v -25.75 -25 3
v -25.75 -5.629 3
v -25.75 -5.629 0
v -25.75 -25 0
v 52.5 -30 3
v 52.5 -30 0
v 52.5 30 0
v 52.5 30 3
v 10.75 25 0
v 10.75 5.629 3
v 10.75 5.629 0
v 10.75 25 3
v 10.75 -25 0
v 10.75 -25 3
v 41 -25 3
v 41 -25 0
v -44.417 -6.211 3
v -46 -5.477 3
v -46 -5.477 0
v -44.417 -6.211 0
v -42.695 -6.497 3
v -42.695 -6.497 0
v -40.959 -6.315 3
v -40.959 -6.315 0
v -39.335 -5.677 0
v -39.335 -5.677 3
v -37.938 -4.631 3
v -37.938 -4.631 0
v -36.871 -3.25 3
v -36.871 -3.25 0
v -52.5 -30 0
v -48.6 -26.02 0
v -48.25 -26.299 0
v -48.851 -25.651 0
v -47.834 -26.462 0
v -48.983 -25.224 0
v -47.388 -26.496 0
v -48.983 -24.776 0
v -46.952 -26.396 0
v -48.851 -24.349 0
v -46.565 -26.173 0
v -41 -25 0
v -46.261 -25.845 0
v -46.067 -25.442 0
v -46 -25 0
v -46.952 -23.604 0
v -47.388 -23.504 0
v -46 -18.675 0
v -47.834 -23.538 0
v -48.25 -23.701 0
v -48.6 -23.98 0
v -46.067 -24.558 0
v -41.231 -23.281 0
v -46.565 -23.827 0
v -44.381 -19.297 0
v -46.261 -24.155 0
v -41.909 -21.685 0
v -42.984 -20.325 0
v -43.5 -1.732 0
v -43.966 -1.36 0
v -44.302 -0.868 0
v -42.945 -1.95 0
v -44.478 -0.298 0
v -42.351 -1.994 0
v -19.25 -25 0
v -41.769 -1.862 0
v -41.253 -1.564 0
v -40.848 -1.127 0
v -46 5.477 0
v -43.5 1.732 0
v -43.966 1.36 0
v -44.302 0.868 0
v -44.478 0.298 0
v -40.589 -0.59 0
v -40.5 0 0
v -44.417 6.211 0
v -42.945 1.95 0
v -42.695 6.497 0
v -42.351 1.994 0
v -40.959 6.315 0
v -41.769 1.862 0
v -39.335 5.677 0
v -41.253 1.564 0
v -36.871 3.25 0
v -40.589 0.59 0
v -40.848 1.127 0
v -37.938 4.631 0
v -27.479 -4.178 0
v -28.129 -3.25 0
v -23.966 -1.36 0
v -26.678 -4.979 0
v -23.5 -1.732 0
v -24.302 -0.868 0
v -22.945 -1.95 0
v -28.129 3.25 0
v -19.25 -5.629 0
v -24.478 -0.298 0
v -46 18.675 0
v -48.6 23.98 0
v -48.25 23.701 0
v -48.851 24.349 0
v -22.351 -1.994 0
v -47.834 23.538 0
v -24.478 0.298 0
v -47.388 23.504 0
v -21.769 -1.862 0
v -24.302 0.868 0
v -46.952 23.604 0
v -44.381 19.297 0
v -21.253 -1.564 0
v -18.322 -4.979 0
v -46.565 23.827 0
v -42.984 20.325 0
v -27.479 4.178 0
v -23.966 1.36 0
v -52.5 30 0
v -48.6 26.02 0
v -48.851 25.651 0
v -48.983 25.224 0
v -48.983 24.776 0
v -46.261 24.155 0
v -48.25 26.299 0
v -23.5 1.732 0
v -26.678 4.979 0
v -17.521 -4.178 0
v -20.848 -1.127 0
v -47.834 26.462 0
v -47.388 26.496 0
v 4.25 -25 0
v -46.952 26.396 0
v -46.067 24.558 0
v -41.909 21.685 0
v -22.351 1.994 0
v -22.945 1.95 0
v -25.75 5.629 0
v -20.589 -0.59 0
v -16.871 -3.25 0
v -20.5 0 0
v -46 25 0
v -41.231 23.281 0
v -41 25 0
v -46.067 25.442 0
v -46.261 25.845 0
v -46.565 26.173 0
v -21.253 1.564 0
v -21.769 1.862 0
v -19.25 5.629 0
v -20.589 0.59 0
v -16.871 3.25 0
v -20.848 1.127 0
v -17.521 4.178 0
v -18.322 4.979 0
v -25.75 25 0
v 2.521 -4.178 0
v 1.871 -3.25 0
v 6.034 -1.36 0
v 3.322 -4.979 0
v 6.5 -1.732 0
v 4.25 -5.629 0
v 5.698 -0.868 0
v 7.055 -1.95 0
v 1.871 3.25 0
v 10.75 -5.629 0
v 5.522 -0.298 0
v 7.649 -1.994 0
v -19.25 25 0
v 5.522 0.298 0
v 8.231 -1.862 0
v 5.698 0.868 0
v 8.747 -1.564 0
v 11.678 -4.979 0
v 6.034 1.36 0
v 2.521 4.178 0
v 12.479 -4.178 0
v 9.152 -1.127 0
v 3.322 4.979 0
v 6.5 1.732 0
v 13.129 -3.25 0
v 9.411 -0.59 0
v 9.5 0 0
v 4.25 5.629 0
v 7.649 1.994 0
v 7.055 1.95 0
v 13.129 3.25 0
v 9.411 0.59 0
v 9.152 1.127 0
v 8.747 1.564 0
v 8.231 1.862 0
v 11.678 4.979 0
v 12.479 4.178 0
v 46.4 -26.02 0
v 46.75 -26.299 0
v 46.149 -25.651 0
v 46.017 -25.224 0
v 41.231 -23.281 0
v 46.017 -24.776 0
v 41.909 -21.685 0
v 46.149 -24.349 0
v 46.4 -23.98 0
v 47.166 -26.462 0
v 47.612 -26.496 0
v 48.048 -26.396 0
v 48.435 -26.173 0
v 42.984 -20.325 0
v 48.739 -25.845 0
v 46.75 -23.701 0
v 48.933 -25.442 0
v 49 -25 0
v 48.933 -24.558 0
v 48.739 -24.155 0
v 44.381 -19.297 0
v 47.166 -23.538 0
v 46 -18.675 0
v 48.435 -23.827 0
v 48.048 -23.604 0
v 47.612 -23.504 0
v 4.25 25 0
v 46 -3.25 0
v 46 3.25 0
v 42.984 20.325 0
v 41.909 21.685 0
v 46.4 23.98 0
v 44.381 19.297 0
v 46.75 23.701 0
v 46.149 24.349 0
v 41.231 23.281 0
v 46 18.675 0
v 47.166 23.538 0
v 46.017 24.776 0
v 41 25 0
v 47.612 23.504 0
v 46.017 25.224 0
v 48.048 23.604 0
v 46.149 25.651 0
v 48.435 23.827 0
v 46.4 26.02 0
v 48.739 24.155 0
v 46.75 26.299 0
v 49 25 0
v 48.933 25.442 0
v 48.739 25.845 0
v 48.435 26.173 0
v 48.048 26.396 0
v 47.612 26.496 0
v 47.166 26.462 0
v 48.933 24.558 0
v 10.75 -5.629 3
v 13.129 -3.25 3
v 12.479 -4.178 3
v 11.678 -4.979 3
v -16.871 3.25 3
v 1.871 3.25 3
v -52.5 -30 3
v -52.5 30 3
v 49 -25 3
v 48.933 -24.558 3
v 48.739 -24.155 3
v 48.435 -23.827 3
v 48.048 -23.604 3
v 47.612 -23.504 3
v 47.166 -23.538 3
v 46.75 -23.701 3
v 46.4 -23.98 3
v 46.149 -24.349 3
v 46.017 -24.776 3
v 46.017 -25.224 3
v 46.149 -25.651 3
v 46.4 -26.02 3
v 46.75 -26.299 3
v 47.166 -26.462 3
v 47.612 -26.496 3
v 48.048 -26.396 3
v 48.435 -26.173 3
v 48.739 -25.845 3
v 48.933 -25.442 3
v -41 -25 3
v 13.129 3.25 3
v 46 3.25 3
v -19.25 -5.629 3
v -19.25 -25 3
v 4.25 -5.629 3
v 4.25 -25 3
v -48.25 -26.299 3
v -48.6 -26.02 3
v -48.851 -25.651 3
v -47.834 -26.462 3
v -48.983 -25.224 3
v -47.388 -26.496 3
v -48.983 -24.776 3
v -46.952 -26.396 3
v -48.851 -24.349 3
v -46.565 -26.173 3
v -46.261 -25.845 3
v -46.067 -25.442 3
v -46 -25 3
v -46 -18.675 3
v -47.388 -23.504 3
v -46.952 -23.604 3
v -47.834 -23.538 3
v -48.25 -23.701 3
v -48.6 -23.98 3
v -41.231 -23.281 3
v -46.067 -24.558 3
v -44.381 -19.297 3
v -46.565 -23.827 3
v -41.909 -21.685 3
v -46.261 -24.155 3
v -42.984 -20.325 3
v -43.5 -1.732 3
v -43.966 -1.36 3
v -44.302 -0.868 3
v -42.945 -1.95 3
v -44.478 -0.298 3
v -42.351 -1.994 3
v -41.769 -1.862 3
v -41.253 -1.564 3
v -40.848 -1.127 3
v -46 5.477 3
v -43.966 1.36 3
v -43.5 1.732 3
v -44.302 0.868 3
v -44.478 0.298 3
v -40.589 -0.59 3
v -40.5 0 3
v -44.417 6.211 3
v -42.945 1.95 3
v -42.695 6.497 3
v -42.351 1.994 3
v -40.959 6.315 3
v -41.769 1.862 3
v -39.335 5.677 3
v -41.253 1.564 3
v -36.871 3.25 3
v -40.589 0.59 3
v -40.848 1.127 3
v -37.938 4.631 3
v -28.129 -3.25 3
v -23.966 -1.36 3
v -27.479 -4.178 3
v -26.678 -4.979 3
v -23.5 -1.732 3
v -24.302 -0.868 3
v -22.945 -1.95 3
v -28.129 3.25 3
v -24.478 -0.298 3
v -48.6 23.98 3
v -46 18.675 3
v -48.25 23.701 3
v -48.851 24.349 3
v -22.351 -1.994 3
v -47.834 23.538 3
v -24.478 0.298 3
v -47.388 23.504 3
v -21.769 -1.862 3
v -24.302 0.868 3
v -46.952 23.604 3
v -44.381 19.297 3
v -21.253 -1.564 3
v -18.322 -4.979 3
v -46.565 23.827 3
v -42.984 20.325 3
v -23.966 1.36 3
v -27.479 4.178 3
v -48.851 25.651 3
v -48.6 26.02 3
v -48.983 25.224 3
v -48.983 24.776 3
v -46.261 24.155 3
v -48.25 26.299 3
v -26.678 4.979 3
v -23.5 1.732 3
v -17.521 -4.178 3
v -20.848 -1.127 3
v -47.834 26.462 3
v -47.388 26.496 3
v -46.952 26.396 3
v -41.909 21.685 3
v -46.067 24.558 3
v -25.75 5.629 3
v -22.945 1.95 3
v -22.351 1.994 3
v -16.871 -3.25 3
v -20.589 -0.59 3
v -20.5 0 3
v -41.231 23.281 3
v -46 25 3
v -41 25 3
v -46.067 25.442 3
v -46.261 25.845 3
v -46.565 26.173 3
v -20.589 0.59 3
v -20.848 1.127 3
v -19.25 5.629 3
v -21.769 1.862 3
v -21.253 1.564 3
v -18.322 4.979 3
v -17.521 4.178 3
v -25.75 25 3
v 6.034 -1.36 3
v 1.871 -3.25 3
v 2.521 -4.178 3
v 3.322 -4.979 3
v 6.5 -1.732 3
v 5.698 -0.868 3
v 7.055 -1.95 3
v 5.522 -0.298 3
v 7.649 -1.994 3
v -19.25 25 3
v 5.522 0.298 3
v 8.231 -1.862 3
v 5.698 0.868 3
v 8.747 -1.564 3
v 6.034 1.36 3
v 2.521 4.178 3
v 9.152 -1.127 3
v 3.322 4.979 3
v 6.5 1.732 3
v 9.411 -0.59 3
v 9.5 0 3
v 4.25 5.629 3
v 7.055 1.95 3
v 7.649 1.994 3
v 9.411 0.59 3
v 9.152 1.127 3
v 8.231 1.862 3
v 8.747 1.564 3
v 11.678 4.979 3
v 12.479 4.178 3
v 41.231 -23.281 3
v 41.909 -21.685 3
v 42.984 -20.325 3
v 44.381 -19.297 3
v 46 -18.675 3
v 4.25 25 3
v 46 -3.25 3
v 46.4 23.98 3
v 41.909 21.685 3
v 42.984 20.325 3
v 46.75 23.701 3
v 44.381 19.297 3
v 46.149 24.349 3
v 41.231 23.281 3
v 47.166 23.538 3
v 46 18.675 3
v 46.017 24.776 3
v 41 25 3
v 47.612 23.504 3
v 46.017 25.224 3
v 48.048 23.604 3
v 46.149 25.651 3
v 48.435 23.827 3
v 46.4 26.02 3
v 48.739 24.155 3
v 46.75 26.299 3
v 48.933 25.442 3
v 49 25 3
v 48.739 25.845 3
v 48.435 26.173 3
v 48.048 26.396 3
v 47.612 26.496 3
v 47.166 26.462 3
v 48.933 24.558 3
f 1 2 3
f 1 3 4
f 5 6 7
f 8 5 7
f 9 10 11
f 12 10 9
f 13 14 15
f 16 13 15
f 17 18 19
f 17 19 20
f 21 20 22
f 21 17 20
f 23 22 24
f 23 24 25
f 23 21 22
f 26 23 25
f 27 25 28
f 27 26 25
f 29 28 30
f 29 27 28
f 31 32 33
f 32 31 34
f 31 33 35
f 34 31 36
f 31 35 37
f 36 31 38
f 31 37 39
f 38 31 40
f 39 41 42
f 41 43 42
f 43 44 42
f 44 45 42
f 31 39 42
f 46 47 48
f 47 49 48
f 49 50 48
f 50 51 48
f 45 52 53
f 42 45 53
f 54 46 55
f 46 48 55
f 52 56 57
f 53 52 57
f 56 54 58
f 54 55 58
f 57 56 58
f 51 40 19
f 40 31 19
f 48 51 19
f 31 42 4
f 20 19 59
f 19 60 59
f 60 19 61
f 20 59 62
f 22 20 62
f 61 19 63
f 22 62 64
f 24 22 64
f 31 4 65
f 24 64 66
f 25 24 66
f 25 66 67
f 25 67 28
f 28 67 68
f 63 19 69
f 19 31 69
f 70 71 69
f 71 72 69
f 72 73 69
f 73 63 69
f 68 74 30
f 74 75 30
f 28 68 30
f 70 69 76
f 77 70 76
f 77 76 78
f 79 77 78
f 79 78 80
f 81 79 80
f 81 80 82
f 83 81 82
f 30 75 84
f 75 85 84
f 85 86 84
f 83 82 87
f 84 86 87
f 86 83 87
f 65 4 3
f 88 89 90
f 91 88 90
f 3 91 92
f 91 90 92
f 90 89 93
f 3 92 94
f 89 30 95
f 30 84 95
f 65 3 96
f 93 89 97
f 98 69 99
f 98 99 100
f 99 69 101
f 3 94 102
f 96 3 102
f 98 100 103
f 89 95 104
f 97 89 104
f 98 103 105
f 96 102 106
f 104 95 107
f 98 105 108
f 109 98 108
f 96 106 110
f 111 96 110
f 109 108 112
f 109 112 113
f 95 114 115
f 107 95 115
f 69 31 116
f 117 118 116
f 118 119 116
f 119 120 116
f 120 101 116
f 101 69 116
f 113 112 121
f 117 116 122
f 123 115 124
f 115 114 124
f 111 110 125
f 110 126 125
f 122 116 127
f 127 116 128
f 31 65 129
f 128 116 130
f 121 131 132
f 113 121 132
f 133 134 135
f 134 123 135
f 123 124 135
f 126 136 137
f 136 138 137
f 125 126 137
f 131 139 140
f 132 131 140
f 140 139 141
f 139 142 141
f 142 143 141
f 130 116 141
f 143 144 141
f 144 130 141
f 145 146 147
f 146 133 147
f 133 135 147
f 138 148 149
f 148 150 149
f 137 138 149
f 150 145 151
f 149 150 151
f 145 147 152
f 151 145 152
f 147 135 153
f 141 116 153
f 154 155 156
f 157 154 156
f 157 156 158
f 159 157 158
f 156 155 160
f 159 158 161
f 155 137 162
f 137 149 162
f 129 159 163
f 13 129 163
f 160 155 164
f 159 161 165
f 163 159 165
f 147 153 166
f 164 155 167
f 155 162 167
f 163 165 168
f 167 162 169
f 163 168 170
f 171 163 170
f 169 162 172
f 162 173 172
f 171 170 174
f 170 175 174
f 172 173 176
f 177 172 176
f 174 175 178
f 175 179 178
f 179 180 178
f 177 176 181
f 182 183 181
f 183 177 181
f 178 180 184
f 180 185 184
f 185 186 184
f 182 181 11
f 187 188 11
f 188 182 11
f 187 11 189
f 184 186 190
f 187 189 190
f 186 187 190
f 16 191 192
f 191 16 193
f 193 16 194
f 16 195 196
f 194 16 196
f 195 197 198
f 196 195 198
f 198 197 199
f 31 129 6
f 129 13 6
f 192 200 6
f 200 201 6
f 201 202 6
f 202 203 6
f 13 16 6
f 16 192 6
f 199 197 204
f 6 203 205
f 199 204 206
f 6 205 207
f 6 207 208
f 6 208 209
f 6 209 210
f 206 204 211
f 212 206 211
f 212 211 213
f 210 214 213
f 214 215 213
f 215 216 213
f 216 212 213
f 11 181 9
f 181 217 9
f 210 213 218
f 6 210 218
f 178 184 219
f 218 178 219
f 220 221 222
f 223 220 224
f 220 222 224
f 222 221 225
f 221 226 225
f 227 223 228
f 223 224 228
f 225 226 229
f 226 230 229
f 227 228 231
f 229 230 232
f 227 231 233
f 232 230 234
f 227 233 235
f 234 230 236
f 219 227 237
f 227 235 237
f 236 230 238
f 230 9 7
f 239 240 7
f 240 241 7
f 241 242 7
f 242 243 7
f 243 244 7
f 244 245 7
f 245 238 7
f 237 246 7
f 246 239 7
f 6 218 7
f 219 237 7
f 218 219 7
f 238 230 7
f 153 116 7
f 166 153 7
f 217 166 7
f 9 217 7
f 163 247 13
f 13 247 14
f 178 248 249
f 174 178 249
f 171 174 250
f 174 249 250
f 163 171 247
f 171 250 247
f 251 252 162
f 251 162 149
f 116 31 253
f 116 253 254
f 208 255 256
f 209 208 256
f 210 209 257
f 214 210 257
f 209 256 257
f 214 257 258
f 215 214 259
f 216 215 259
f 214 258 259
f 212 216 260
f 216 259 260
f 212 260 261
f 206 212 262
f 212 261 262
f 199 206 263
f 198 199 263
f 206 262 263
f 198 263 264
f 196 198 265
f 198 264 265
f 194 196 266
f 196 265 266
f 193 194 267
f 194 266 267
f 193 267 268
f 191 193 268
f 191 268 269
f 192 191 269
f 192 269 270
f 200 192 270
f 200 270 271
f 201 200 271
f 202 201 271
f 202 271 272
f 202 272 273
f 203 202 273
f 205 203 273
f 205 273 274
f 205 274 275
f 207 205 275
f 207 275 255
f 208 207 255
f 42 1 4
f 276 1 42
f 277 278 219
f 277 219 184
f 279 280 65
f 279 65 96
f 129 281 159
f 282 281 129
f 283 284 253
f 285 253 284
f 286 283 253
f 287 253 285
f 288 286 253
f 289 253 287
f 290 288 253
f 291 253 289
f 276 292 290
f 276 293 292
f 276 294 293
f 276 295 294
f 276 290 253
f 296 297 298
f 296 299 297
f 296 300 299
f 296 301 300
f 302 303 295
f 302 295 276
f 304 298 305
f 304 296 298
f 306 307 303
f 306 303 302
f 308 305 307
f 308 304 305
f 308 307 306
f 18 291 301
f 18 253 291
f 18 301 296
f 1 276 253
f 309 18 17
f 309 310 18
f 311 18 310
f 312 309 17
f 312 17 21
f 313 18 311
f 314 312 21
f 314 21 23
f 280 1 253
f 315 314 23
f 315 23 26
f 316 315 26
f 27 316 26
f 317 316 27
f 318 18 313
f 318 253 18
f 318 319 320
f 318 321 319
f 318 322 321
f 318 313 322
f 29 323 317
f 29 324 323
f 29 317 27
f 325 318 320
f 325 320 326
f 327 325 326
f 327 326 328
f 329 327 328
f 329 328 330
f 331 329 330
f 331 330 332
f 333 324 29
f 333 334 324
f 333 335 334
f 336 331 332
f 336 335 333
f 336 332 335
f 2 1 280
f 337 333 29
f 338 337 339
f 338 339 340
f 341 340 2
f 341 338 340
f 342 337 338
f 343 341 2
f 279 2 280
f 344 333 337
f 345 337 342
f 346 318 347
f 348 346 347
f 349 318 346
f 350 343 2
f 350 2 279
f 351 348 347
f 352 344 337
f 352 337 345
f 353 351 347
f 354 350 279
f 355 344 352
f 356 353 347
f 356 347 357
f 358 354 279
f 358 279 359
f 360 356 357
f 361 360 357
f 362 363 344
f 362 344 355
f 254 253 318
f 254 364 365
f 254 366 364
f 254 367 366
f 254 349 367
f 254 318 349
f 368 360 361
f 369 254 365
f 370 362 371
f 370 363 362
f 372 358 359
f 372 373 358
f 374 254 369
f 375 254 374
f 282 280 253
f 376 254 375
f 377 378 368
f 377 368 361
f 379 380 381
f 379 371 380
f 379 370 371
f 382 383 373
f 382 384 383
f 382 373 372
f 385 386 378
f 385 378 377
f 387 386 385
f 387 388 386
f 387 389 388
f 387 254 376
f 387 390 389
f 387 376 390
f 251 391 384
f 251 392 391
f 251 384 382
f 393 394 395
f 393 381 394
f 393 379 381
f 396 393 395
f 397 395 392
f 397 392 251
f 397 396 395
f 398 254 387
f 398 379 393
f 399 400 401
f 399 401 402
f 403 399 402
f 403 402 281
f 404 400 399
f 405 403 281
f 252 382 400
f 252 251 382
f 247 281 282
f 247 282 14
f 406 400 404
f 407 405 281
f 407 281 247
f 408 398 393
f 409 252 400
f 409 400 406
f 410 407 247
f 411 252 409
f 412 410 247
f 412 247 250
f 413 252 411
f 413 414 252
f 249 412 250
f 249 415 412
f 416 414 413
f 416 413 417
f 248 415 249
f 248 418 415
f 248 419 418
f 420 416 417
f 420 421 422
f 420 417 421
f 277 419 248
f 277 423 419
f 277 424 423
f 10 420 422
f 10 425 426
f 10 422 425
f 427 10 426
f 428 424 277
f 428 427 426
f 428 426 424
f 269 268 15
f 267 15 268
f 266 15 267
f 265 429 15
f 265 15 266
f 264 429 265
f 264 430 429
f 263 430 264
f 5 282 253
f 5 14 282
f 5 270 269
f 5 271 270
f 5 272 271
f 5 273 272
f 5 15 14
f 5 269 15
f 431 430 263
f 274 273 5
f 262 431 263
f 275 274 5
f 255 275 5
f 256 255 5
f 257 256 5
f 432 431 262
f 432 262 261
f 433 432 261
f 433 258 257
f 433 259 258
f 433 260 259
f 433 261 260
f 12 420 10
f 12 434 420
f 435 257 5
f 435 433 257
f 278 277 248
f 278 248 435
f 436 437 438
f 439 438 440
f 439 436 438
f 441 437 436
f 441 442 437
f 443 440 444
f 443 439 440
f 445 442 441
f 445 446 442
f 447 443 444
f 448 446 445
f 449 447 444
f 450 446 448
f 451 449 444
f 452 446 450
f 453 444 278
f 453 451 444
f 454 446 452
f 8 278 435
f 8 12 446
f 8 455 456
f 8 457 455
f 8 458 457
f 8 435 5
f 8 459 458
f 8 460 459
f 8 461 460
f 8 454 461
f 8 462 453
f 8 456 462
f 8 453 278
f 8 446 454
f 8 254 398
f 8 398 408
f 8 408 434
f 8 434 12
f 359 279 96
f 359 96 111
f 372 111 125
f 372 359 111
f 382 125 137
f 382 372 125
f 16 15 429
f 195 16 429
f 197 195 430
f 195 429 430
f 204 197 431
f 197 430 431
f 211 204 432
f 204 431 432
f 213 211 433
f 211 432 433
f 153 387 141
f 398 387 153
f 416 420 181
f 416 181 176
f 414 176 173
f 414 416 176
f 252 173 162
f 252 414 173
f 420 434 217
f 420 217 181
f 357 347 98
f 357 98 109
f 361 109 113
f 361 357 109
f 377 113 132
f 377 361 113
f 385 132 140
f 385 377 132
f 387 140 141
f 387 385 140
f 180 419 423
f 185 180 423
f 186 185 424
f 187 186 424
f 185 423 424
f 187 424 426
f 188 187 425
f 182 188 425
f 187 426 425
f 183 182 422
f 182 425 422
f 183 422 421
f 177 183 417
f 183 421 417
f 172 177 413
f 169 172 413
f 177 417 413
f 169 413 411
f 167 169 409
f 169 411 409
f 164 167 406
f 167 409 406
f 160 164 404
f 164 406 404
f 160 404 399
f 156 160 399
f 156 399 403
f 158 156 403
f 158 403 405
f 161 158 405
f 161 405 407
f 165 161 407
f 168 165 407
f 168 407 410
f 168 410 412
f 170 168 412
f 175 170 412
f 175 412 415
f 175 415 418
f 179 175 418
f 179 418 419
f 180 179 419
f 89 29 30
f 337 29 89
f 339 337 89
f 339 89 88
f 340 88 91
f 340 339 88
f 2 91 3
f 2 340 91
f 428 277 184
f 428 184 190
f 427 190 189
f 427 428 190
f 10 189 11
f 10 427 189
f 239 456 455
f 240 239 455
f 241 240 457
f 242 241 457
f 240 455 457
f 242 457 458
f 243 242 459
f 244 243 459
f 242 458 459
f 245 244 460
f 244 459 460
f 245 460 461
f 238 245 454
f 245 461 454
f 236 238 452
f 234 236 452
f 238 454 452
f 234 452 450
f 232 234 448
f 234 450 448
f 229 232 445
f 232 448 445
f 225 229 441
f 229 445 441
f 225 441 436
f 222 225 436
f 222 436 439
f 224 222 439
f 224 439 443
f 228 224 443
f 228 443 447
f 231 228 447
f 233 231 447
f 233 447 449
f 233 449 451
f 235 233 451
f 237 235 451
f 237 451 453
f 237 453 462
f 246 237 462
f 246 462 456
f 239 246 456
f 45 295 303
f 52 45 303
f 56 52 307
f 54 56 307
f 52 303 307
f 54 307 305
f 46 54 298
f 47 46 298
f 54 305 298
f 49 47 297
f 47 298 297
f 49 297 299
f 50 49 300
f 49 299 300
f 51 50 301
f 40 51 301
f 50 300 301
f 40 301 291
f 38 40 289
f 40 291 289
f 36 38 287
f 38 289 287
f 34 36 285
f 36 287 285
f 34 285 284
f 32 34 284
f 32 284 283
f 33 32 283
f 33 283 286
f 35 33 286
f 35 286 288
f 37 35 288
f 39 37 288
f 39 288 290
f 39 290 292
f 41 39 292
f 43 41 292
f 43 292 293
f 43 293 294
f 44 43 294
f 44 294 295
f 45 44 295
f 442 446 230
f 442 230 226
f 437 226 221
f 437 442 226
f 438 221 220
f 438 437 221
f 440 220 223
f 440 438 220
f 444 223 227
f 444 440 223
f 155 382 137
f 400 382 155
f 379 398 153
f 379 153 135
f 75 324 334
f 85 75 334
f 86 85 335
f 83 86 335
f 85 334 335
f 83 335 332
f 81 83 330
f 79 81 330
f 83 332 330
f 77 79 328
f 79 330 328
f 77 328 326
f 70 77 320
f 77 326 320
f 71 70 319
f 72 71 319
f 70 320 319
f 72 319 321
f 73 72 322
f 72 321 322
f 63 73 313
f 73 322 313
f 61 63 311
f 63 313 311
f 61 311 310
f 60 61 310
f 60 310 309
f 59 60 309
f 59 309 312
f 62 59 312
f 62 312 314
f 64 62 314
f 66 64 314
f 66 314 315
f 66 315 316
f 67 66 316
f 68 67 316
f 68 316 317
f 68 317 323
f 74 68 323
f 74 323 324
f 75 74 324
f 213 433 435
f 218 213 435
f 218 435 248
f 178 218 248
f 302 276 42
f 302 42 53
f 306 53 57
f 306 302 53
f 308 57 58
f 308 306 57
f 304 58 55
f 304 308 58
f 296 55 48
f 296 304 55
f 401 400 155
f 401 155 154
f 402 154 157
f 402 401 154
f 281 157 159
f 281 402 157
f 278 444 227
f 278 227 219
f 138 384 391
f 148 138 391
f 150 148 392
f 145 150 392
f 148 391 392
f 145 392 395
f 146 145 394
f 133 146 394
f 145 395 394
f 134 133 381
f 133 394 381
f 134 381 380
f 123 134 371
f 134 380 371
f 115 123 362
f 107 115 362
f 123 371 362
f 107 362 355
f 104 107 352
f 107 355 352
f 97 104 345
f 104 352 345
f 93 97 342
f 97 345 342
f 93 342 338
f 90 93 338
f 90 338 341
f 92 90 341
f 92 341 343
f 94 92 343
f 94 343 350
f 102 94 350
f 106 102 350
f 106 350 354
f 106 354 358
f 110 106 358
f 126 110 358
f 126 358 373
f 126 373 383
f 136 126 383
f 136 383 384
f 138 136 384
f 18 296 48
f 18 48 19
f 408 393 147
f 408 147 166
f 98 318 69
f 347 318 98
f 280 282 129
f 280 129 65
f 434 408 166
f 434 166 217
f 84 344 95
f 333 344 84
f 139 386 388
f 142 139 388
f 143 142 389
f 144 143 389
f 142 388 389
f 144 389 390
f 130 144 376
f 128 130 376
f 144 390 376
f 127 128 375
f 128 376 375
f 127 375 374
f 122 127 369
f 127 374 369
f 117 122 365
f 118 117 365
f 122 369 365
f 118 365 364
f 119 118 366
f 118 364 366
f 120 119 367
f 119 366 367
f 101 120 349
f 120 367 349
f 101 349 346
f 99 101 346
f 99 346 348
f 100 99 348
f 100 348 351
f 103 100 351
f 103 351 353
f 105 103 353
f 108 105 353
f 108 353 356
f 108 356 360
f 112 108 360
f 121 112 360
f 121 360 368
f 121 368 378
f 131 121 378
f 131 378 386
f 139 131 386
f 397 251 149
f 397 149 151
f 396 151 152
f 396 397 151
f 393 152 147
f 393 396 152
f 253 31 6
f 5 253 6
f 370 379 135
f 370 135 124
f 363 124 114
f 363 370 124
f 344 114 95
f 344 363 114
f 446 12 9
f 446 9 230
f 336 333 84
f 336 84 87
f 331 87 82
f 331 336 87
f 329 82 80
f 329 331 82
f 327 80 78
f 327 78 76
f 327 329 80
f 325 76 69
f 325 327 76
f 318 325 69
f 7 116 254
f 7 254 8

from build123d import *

# Parameters (mm, degrees)
SKETCH2_W           = 105
SKETCH2_H           = 60
BOSS_EXTRUDE1_DEPTH = 3
SKETCH3_R           = 1.5
SKETCH3_R_2         = 2
CUT_EXTRUDE1_DEPTH  = 4
CUT_EXTRUDE2_DEPTH  = 4


with BuildPart() as part:
    # Sketch2 → Boss-Extrude1 (new body)
    with BuildSketch(Plane.XY):
        Rectangle(SKETCH2_W, SKETCH2_H)
    extrude(amount=BOSS_EXTRUDE1_DEPTH)

    # Sketch3 → Cut-Extrude1 (cut, through all)
    with BuildSketch(Plane.XY.offset(3)):
        with Locations((-47.5, 25)):
            Circle(SKETCH3_R)
        with Locations((47.5, 25)):
            Circle(SKETCH3_R)
        with Locations((47.5, -25)):
            Circle(SKETCH3_R)
        with Locations((-47.5, -25)):
            Circle(SKETCH3_R)
        with Locations((-42.5, 0)):
            Circle(SKETCH3_R_2)
        with Locations((-22.5, 0)):
            Circle(SKETCH3_R_2)
        with Locations((7.5, 0)):
            Circle(SKETCH3_R_2)
    extrude(amount=-CUT_EXTRUDE1_DEPTH, mode=Mode.SUBTRACT)

    # Sketch4 → Cut-Extrude2 (cut, through all)
    with BuildSketch(Plane.XY.offset(3)):
        with BuildLine():
            Line((-41, 25), (-25.75, 25))
            Line((-25.75, 25), (-25.75, 5.629165125))
            ThreePointArc((-25.75, 5.629165125), (-27.096194078, 4.596194078), (-28.129165125, 3.25))
            Line((-28.129165125, 3.25), (-36.870834875, 3.25))
            ThreePointArc((-36.870834875, 3.25), (-40.959393148, 6.314786657), (-46, 5.477225575))
            Line((-46, 5.477225575), (-46, 18.67544468))
            ThreePointArc((-46, 18.67544468), (-42.400980486, 20.968871126), (-41, 25))
        make_face()
        with BuildLine():
            Line((-19.25, 25), (4.25, 25))
            Line((4.25, 25), (4.25, 5.629165125))
            ThreePointArc((4.25, 5.629165125), (2.903805922, 4.596194078), (1.870834875, 3.25))
            Line((1.870834875, 3.25), (-16.870834875, 3.25))
            ThreePointArc((-16.870834875, 3.25), (-17.903805922, 4.596194078), (-19.25, 5.629165125))
            Line((-19.25, 5.629165125), (-19.25, 25))
        make_face()
        with BuildLine():
            Line((46, 18.67544468), (46, 3.25))
            Line((46, 3.25), (13.129165125, 3.25))
            ThreePointArc((13.129165125, 3.25), (12.096194078, 4.596194078), (10.75, 5.629165125))
            Line((10.75, 5.629165125), (10.75, 25))
            Line((10.75, 25), (41, 25))
            ThreePointArc((41, 25), (42.400980486, 20.968871126), (46, 18.67544468))
        make_face()
        with BuildLine():
            Line((46, -3.25), (13.129165125, -3.25))
            ThreePointArc((13.129165125, -3.25), (12.096194078, -4.596194078), (10.75, -5.629165125))
            Line((10.75, -5.629165125), (10.75, -25))
            Line((10.75, -25), (41, -25))
            ThreePointArc((41, -25), (42.400980486, -20.968871126), (46, -18.67544468))
            Line((46, -18.67544468), (46, -3.25))
        make_face()
        with BuildLine():
            Line((-16.870834875, -3.25), (1.870834875, -3.25))
            ThreePointArc((1.870834875, -3.25), (2.903805922, -4.596194078), (4.25, -5.629165125))
            Line((4.25, -5.629165125), (4.25, -25))
            Line((4.25, -25), (-19.25, -25))
            Line((-19.25, -25), (-19.25, -5.629165125))
            ThreePointArc((-19.25, -5.629165125), (-17.903805922, -4.596194078), (-16.870834875, -3.25))
        make_face()
        with BuildLine():
            Line((-46, -18.67544468), (-46, -5.477225575))
            ThreePointArc((-46, -5.477225575), (-40.959393148, -6.314786657), (-36.870834875, -3.25))
            Line((-36.870834875, -3.25), (-28.129165125, -3.25))
            ThreePointArc((-28.129165125, -3.25), (-27.096194078, -4.596194078), (-25.75, -5.629165125))
            Line((-25.75, -5.629165125), (-25.75, -25))
            Line((-25.75, -25), (-41, -25))
            ThreePointArc((-41, -25), (-42.400980486, -20.968871126), (-46, -18.67544468))
        make_face()
    extrude(amount=-CUT_EXTRUDE2_DEPTH, mode=Mode.SUBTRACT)


solid = part.part
